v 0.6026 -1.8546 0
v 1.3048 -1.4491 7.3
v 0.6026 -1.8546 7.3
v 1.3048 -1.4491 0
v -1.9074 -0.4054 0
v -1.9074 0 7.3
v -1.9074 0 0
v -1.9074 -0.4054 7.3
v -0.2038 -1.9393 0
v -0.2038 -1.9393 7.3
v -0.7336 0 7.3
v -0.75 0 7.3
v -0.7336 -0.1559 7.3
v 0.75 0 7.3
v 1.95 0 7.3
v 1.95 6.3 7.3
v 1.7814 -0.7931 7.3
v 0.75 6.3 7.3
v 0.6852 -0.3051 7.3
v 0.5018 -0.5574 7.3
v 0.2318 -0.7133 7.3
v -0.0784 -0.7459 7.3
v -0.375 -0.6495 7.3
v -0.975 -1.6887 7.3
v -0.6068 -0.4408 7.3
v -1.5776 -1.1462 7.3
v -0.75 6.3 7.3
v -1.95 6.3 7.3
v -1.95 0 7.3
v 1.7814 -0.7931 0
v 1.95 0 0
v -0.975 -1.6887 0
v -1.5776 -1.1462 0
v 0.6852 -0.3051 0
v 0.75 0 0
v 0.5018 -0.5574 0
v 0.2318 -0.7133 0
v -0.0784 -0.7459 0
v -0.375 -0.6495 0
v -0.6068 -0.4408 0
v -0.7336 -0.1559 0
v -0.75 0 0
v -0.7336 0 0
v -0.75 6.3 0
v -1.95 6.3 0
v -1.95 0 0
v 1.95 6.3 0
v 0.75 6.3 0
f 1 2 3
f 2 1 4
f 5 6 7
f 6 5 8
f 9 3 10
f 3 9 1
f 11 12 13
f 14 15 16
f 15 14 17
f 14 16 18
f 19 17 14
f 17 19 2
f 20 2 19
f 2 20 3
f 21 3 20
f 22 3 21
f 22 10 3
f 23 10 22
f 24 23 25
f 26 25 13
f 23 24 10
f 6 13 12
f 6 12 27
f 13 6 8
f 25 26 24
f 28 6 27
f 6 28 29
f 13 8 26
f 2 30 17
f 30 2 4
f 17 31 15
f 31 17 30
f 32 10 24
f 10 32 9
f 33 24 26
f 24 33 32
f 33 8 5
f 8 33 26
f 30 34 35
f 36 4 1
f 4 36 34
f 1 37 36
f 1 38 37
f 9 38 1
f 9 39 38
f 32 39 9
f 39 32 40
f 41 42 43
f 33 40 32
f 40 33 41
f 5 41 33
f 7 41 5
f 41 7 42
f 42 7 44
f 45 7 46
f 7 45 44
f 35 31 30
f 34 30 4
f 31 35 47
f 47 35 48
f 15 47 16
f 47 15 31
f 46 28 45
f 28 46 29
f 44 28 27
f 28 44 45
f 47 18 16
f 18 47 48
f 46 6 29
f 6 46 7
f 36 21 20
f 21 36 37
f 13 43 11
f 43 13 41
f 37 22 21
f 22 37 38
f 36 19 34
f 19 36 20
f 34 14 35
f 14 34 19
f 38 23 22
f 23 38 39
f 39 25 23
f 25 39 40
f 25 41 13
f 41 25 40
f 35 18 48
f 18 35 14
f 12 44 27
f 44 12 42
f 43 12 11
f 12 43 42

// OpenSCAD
function DrillPressSpringHookDiameter(3dPrinterTolerance=.3)=3.6+3dPrinterTolerance;
function DrillPressSpringHookLength(3dPrinterTolerance=.3)=6+3dPrinterTolerance;
function DrillPressSpringWidth(3dPrinterTolerance=.3)=7+3dPrinterTolerance;
function DrillPressSpringThickness(3dPrinterTolerance=.3)=0.9+3dPrinterTolerance;
function DrillPressSpringOuterDiameter(3dPrinterTolerance=.3)=43+3dPrinterTolerance;





module DrillPressSpringHook(3dPrinterTolerance=.3)
{
	difference()
	{
		union()
		{
			cylinder(r=DrillPressSpringHookDiameter(3dPrinterTolerance)/2, h=DrillPressSpringWidth(3dPrinterTolerance), $fn=15);
			translate([-DrillPressSpringHookDiameter(3dPrinterTolerance)/2,0,0])
			{
				cube([DrillPressSpringHookDiameter(3dPrinterTolerance),DrillPressSpringHookLength(3dPrinterTolerance),DrillPressSpringWidth(3dPrinterTolerance)]);
			}
		translate([-DrillPressSpringHookDiameter(3dPrinterTolerance)/2,0,0])
			{
				%cube([DrillPressSpringThickness(3dPrinterTolerance),DrillPressSpringHookLength(3dPrinterTolerance)*3,DrillPressSpringWidth(3dPrinterTolerance)]);
			}
		}
		translate([0,0,-1])
		{
			cylinder(r=DrillPressSpringHookDiameter(3dPrinterTolerance)/2-DrillPressSpringThickness(3dPrinterTolerance), h=DrillPressSpringWidth(3dPrinterTolerance)+2, $fn=15);
		}
		translate([DrillPressSpringThickness()-DrillPressSpringHookDiameter(3dPrinterTolerance)/2,0,-1])
		{
			cube([DrillPressSpringHookDiameter(3dPrinterTolerance)-DrillPressSpringThickness(3dPrinterTolerance)*2,DrillPressSpringHookLength(3dPrinterTolerance)+1,DrillPressSpringWidth(3dPrinterTolerance)+2]);
		}
	}
}

DrillPressSpringHook();
